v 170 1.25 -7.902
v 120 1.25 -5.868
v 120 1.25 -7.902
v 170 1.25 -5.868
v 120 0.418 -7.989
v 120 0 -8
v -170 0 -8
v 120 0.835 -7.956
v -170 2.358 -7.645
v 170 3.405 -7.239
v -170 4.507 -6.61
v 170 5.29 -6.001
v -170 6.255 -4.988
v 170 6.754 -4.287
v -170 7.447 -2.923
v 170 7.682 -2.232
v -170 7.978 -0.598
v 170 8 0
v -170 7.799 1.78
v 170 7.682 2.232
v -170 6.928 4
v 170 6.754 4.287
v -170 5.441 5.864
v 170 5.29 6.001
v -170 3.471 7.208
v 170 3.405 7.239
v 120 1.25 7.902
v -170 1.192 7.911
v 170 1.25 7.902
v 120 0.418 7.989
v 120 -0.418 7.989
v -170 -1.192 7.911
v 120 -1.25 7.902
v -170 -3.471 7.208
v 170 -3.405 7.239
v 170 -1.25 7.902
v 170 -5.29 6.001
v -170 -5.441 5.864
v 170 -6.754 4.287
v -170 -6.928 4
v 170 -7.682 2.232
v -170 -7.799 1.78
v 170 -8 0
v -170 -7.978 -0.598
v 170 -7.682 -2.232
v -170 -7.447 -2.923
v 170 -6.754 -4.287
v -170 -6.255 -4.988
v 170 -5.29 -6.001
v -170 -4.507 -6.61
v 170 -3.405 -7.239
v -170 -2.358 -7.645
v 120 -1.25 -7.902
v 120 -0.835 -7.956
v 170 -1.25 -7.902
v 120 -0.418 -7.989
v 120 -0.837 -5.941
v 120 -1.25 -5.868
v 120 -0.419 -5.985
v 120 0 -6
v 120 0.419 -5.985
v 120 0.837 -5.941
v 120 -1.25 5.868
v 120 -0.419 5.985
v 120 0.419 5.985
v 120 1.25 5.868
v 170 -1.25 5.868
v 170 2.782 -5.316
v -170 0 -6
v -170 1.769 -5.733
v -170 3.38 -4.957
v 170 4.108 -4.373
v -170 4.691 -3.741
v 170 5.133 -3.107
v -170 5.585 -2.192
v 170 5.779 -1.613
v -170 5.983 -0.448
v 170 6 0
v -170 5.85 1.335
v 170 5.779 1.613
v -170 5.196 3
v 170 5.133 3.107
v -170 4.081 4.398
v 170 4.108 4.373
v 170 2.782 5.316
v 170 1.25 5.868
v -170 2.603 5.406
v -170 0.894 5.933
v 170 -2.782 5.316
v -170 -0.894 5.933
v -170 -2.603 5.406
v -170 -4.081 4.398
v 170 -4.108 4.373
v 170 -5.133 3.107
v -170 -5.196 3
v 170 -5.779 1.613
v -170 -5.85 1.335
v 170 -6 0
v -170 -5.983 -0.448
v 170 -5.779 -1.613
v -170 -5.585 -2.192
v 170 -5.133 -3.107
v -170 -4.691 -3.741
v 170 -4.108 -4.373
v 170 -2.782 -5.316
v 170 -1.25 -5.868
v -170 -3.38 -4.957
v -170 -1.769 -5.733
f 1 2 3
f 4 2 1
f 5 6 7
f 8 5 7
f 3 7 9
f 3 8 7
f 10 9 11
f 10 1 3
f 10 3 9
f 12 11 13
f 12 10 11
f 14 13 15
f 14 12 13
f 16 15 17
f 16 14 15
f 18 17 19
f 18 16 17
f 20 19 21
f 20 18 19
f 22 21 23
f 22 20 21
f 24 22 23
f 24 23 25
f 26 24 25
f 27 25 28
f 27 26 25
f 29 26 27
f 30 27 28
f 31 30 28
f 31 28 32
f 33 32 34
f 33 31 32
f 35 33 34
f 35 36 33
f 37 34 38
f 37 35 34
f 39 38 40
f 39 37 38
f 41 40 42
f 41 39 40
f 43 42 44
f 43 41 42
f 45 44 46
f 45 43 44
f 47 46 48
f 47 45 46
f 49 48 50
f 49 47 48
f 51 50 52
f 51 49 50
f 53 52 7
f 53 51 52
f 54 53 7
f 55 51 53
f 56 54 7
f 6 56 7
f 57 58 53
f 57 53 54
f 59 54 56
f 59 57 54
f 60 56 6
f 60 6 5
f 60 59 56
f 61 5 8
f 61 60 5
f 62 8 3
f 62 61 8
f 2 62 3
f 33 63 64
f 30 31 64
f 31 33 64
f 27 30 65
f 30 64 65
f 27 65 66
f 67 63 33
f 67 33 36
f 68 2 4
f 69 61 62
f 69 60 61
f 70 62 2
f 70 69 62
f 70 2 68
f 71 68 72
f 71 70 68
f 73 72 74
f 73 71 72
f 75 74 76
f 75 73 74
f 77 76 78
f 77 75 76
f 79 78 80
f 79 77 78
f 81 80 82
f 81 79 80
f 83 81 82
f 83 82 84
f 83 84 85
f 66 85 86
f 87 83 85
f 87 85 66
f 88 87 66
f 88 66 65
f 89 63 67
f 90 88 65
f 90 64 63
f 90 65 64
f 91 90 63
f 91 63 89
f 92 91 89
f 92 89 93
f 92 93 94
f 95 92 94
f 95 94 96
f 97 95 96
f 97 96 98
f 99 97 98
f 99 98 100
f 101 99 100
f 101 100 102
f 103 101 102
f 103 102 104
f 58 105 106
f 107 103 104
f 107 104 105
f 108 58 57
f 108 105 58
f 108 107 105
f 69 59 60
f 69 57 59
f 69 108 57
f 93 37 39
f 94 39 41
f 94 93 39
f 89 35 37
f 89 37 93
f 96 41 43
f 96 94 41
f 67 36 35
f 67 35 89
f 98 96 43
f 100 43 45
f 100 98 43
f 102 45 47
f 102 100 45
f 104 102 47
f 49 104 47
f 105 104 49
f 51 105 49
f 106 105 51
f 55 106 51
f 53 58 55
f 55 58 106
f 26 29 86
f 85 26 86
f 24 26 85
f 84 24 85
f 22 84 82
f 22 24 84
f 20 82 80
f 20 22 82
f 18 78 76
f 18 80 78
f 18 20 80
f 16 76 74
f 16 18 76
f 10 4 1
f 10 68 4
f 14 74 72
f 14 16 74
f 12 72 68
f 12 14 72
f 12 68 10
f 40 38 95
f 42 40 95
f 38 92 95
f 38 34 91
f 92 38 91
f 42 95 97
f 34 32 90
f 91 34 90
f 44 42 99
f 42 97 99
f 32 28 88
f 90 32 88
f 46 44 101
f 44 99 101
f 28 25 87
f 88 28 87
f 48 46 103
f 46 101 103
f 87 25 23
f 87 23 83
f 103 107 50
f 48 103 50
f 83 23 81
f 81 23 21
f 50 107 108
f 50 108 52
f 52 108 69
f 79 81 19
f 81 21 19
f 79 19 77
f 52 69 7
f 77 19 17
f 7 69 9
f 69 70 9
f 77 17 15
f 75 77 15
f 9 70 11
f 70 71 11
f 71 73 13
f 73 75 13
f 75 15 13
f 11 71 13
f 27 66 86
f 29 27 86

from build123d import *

# Parameters (mm, degrees)
SKETCH1_R               = 8
SKETCH1_R_2             = 6
BOSS_EXTRUDE1_DEPTH     = 170
SKETCH2_W               = 50
SKETCH2_H               = 2.5
CUT_EXTRUDE1_DEPTH      = 9
CUT_EXTRUDE1_DEPTH_BACK = 9


with BuildPart() as part:
    # Sketch1 → Boss-Extrude1 (new body, symmetric)
    with BuildSketch(Plane(origin=(0, 0, 0), x_dir=(0, 0, -1), z_dir=(1, 0, 0))):
        Circle(SKETCH1_R)
        Circle(SKETCH1_R_2, mode=Mode.SUBTRACT)
    extrude(amount=BOSS_EXTRUDE1_DEPTH, both=True)

    # Sketch2 → Cut-Extrude1 (cut, two sides)
    with BuildSketch(Plane.XY) as cut_extrude1_sk:
        with Locations((145, 0)):
            Rectangle(SKETCH2_W, SKETCH2_H)
    extrude(amount=CUT_EXTRUDE1_DEPTH, mode=Mode.SUBTRACT)
    extrude(cut_extrude1_sk.sketch, amount=-CUT_EXTRUDE1_DEPTH_BACK, mode=Mode.SUBTRACT)


solid = part.part
